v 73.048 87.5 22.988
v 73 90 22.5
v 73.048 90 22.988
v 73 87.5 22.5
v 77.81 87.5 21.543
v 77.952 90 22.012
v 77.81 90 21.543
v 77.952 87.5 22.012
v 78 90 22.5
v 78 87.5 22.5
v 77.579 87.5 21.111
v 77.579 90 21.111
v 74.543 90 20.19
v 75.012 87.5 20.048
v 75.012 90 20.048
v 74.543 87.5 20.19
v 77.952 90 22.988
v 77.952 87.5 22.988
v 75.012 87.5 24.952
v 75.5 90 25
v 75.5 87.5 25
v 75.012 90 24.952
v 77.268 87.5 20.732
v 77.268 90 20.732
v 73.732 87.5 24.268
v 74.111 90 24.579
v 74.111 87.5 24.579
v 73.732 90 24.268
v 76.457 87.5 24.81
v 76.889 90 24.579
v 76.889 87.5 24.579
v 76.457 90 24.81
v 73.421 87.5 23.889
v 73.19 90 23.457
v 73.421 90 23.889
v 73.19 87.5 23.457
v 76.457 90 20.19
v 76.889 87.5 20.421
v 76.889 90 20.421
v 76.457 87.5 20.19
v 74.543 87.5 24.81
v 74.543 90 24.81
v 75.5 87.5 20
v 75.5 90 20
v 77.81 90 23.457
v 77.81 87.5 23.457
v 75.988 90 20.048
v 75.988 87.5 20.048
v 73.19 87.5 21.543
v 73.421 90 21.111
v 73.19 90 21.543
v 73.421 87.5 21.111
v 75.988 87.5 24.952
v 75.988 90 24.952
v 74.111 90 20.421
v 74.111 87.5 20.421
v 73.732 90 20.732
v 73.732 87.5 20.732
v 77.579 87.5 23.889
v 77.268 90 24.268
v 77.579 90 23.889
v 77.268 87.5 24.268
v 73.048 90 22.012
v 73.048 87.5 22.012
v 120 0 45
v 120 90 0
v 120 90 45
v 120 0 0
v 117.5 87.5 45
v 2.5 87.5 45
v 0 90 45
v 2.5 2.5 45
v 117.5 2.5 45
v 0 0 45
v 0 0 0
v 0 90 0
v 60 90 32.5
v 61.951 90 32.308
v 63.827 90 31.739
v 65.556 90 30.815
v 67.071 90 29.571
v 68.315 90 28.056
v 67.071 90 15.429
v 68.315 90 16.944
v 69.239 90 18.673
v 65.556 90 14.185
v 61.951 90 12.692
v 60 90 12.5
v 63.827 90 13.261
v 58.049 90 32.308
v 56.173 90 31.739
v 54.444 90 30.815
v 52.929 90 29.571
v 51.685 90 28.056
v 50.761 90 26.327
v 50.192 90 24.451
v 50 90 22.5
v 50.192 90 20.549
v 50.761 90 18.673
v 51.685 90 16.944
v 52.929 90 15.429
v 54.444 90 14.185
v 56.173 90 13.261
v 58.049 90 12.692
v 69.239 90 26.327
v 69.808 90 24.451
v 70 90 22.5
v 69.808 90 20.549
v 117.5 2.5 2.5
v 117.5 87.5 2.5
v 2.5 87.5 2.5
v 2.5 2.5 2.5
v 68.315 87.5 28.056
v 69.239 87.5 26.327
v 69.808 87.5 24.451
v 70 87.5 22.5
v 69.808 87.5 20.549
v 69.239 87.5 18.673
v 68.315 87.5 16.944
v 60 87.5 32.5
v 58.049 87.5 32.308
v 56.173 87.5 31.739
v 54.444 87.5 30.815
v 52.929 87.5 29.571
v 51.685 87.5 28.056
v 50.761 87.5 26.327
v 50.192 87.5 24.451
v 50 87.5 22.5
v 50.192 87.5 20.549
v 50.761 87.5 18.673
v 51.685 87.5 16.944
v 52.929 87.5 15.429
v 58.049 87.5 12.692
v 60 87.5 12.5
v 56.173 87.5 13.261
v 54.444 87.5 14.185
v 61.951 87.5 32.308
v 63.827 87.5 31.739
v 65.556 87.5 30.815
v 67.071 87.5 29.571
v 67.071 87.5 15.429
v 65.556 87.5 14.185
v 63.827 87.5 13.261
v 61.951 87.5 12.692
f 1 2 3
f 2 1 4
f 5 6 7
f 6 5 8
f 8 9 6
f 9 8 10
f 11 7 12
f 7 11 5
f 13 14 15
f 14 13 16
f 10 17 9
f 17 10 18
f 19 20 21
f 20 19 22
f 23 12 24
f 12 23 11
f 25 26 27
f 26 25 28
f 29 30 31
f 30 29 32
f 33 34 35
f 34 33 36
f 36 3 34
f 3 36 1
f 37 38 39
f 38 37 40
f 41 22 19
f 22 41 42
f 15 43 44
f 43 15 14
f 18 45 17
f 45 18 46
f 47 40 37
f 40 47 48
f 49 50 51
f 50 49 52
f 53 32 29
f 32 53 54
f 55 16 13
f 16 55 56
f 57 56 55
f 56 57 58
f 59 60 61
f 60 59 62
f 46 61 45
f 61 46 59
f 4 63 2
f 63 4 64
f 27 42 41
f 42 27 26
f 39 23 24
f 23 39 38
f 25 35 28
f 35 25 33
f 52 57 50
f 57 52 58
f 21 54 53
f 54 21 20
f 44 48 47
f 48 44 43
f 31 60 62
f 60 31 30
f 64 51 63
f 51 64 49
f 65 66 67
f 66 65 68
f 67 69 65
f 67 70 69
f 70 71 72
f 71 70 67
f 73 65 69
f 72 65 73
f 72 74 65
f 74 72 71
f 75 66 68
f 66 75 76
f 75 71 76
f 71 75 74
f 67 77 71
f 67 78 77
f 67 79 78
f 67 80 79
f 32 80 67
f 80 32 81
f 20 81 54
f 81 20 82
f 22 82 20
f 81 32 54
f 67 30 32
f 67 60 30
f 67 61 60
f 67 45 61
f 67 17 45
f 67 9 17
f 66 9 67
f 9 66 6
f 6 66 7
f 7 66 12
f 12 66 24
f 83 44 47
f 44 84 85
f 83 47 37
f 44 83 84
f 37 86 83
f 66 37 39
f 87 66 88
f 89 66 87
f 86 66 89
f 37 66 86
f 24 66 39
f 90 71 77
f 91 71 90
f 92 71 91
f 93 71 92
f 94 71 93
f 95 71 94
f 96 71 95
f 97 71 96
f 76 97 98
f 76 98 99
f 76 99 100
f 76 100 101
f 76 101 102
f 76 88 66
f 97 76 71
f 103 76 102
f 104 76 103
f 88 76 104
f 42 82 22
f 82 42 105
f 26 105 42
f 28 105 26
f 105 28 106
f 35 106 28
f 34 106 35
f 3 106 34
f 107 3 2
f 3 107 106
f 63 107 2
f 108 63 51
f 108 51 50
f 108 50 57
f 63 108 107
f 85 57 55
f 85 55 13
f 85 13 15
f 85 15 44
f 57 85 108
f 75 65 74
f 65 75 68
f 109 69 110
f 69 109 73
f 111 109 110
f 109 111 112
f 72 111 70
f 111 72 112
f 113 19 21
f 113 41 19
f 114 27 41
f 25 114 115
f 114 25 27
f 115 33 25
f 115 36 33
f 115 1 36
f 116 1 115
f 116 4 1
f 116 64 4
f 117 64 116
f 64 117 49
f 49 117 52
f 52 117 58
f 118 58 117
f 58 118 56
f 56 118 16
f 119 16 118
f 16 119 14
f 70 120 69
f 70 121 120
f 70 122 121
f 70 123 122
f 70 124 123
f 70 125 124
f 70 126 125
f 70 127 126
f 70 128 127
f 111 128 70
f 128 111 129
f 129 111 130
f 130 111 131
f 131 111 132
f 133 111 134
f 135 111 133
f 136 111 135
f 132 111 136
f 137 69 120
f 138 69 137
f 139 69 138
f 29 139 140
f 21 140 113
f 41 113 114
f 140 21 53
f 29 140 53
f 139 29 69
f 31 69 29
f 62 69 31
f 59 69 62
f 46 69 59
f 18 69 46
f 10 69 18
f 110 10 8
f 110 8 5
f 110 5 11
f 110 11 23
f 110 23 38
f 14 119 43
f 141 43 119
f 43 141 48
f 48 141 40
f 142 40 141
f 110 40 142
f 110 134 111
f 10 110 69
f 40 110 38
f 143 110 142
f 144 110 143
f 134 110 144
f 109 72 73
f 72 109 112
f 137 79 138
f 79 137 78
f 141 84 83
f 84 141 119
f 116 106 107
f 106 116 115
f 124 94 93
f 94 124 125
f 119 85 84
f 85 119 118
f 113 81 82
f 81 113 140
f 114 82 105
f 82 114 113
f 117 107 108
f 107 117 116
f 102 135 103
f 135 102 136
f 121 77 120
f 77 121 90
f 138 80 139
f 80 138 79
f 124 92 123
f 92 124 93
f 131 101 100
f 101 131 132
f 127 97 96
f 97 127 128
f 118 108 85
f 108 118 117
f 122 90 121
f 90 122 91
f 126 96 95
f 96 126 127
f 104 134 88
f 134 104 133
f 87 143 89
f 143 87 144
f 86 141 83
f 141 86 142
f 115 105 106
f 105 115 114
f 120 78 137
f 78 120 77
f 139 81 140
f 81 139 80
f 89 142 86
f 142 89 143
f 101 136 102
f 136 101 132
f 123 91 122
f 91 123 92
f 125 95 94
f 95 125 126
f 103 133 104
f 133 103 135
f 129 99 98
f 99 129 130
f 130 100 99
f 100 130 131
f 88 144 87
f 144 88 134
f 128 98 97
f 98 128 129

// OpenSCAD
$fn = 32;

// ----------------------------------------------------------------------
// Vent box: roundvent enclosure
// ----------------------------------------------------------------------

// --- parameters (mm) ---
box_l = 120;              // box length, X
box_w = 90;               // box width, Y
box_h = 45;               // box height, Z
wall_t = 2.5;             // shell wall thickness
vent_d = 20;              // central vent diameter
ring_d = 5;               // ring hole diameter
n_ring = 8;               // holes in the ring
ring_r = 15.5;            // ring radius

ring_step = 360 / n_ring;  // ring hole angular step

difference() {
  cube([box_l, box_w, box_h]);
  translate([wall_t, wall_t, wall_t])
    cube([box_l - 2 * wall_t, box_w - 2 * wall_t, box_h]);
  translate([box_l / 2, box_w - wall_t - 1, box_h / 2])
    rotate([-90, 0, 0]) cylinder(h = wall_t + 2, d = vent_d);
  for (i = [0 : n_ring - 1])
    translate([box_l / 2, box_w - wall_t - 1, box_h / 2])
      rotate([0, 0, i * ring_step])
        translate([ring_r, 0, 0]) rotate([-90, 0, 0])
          cylinder(h = wall_t + 2, d = ring_d);
}
